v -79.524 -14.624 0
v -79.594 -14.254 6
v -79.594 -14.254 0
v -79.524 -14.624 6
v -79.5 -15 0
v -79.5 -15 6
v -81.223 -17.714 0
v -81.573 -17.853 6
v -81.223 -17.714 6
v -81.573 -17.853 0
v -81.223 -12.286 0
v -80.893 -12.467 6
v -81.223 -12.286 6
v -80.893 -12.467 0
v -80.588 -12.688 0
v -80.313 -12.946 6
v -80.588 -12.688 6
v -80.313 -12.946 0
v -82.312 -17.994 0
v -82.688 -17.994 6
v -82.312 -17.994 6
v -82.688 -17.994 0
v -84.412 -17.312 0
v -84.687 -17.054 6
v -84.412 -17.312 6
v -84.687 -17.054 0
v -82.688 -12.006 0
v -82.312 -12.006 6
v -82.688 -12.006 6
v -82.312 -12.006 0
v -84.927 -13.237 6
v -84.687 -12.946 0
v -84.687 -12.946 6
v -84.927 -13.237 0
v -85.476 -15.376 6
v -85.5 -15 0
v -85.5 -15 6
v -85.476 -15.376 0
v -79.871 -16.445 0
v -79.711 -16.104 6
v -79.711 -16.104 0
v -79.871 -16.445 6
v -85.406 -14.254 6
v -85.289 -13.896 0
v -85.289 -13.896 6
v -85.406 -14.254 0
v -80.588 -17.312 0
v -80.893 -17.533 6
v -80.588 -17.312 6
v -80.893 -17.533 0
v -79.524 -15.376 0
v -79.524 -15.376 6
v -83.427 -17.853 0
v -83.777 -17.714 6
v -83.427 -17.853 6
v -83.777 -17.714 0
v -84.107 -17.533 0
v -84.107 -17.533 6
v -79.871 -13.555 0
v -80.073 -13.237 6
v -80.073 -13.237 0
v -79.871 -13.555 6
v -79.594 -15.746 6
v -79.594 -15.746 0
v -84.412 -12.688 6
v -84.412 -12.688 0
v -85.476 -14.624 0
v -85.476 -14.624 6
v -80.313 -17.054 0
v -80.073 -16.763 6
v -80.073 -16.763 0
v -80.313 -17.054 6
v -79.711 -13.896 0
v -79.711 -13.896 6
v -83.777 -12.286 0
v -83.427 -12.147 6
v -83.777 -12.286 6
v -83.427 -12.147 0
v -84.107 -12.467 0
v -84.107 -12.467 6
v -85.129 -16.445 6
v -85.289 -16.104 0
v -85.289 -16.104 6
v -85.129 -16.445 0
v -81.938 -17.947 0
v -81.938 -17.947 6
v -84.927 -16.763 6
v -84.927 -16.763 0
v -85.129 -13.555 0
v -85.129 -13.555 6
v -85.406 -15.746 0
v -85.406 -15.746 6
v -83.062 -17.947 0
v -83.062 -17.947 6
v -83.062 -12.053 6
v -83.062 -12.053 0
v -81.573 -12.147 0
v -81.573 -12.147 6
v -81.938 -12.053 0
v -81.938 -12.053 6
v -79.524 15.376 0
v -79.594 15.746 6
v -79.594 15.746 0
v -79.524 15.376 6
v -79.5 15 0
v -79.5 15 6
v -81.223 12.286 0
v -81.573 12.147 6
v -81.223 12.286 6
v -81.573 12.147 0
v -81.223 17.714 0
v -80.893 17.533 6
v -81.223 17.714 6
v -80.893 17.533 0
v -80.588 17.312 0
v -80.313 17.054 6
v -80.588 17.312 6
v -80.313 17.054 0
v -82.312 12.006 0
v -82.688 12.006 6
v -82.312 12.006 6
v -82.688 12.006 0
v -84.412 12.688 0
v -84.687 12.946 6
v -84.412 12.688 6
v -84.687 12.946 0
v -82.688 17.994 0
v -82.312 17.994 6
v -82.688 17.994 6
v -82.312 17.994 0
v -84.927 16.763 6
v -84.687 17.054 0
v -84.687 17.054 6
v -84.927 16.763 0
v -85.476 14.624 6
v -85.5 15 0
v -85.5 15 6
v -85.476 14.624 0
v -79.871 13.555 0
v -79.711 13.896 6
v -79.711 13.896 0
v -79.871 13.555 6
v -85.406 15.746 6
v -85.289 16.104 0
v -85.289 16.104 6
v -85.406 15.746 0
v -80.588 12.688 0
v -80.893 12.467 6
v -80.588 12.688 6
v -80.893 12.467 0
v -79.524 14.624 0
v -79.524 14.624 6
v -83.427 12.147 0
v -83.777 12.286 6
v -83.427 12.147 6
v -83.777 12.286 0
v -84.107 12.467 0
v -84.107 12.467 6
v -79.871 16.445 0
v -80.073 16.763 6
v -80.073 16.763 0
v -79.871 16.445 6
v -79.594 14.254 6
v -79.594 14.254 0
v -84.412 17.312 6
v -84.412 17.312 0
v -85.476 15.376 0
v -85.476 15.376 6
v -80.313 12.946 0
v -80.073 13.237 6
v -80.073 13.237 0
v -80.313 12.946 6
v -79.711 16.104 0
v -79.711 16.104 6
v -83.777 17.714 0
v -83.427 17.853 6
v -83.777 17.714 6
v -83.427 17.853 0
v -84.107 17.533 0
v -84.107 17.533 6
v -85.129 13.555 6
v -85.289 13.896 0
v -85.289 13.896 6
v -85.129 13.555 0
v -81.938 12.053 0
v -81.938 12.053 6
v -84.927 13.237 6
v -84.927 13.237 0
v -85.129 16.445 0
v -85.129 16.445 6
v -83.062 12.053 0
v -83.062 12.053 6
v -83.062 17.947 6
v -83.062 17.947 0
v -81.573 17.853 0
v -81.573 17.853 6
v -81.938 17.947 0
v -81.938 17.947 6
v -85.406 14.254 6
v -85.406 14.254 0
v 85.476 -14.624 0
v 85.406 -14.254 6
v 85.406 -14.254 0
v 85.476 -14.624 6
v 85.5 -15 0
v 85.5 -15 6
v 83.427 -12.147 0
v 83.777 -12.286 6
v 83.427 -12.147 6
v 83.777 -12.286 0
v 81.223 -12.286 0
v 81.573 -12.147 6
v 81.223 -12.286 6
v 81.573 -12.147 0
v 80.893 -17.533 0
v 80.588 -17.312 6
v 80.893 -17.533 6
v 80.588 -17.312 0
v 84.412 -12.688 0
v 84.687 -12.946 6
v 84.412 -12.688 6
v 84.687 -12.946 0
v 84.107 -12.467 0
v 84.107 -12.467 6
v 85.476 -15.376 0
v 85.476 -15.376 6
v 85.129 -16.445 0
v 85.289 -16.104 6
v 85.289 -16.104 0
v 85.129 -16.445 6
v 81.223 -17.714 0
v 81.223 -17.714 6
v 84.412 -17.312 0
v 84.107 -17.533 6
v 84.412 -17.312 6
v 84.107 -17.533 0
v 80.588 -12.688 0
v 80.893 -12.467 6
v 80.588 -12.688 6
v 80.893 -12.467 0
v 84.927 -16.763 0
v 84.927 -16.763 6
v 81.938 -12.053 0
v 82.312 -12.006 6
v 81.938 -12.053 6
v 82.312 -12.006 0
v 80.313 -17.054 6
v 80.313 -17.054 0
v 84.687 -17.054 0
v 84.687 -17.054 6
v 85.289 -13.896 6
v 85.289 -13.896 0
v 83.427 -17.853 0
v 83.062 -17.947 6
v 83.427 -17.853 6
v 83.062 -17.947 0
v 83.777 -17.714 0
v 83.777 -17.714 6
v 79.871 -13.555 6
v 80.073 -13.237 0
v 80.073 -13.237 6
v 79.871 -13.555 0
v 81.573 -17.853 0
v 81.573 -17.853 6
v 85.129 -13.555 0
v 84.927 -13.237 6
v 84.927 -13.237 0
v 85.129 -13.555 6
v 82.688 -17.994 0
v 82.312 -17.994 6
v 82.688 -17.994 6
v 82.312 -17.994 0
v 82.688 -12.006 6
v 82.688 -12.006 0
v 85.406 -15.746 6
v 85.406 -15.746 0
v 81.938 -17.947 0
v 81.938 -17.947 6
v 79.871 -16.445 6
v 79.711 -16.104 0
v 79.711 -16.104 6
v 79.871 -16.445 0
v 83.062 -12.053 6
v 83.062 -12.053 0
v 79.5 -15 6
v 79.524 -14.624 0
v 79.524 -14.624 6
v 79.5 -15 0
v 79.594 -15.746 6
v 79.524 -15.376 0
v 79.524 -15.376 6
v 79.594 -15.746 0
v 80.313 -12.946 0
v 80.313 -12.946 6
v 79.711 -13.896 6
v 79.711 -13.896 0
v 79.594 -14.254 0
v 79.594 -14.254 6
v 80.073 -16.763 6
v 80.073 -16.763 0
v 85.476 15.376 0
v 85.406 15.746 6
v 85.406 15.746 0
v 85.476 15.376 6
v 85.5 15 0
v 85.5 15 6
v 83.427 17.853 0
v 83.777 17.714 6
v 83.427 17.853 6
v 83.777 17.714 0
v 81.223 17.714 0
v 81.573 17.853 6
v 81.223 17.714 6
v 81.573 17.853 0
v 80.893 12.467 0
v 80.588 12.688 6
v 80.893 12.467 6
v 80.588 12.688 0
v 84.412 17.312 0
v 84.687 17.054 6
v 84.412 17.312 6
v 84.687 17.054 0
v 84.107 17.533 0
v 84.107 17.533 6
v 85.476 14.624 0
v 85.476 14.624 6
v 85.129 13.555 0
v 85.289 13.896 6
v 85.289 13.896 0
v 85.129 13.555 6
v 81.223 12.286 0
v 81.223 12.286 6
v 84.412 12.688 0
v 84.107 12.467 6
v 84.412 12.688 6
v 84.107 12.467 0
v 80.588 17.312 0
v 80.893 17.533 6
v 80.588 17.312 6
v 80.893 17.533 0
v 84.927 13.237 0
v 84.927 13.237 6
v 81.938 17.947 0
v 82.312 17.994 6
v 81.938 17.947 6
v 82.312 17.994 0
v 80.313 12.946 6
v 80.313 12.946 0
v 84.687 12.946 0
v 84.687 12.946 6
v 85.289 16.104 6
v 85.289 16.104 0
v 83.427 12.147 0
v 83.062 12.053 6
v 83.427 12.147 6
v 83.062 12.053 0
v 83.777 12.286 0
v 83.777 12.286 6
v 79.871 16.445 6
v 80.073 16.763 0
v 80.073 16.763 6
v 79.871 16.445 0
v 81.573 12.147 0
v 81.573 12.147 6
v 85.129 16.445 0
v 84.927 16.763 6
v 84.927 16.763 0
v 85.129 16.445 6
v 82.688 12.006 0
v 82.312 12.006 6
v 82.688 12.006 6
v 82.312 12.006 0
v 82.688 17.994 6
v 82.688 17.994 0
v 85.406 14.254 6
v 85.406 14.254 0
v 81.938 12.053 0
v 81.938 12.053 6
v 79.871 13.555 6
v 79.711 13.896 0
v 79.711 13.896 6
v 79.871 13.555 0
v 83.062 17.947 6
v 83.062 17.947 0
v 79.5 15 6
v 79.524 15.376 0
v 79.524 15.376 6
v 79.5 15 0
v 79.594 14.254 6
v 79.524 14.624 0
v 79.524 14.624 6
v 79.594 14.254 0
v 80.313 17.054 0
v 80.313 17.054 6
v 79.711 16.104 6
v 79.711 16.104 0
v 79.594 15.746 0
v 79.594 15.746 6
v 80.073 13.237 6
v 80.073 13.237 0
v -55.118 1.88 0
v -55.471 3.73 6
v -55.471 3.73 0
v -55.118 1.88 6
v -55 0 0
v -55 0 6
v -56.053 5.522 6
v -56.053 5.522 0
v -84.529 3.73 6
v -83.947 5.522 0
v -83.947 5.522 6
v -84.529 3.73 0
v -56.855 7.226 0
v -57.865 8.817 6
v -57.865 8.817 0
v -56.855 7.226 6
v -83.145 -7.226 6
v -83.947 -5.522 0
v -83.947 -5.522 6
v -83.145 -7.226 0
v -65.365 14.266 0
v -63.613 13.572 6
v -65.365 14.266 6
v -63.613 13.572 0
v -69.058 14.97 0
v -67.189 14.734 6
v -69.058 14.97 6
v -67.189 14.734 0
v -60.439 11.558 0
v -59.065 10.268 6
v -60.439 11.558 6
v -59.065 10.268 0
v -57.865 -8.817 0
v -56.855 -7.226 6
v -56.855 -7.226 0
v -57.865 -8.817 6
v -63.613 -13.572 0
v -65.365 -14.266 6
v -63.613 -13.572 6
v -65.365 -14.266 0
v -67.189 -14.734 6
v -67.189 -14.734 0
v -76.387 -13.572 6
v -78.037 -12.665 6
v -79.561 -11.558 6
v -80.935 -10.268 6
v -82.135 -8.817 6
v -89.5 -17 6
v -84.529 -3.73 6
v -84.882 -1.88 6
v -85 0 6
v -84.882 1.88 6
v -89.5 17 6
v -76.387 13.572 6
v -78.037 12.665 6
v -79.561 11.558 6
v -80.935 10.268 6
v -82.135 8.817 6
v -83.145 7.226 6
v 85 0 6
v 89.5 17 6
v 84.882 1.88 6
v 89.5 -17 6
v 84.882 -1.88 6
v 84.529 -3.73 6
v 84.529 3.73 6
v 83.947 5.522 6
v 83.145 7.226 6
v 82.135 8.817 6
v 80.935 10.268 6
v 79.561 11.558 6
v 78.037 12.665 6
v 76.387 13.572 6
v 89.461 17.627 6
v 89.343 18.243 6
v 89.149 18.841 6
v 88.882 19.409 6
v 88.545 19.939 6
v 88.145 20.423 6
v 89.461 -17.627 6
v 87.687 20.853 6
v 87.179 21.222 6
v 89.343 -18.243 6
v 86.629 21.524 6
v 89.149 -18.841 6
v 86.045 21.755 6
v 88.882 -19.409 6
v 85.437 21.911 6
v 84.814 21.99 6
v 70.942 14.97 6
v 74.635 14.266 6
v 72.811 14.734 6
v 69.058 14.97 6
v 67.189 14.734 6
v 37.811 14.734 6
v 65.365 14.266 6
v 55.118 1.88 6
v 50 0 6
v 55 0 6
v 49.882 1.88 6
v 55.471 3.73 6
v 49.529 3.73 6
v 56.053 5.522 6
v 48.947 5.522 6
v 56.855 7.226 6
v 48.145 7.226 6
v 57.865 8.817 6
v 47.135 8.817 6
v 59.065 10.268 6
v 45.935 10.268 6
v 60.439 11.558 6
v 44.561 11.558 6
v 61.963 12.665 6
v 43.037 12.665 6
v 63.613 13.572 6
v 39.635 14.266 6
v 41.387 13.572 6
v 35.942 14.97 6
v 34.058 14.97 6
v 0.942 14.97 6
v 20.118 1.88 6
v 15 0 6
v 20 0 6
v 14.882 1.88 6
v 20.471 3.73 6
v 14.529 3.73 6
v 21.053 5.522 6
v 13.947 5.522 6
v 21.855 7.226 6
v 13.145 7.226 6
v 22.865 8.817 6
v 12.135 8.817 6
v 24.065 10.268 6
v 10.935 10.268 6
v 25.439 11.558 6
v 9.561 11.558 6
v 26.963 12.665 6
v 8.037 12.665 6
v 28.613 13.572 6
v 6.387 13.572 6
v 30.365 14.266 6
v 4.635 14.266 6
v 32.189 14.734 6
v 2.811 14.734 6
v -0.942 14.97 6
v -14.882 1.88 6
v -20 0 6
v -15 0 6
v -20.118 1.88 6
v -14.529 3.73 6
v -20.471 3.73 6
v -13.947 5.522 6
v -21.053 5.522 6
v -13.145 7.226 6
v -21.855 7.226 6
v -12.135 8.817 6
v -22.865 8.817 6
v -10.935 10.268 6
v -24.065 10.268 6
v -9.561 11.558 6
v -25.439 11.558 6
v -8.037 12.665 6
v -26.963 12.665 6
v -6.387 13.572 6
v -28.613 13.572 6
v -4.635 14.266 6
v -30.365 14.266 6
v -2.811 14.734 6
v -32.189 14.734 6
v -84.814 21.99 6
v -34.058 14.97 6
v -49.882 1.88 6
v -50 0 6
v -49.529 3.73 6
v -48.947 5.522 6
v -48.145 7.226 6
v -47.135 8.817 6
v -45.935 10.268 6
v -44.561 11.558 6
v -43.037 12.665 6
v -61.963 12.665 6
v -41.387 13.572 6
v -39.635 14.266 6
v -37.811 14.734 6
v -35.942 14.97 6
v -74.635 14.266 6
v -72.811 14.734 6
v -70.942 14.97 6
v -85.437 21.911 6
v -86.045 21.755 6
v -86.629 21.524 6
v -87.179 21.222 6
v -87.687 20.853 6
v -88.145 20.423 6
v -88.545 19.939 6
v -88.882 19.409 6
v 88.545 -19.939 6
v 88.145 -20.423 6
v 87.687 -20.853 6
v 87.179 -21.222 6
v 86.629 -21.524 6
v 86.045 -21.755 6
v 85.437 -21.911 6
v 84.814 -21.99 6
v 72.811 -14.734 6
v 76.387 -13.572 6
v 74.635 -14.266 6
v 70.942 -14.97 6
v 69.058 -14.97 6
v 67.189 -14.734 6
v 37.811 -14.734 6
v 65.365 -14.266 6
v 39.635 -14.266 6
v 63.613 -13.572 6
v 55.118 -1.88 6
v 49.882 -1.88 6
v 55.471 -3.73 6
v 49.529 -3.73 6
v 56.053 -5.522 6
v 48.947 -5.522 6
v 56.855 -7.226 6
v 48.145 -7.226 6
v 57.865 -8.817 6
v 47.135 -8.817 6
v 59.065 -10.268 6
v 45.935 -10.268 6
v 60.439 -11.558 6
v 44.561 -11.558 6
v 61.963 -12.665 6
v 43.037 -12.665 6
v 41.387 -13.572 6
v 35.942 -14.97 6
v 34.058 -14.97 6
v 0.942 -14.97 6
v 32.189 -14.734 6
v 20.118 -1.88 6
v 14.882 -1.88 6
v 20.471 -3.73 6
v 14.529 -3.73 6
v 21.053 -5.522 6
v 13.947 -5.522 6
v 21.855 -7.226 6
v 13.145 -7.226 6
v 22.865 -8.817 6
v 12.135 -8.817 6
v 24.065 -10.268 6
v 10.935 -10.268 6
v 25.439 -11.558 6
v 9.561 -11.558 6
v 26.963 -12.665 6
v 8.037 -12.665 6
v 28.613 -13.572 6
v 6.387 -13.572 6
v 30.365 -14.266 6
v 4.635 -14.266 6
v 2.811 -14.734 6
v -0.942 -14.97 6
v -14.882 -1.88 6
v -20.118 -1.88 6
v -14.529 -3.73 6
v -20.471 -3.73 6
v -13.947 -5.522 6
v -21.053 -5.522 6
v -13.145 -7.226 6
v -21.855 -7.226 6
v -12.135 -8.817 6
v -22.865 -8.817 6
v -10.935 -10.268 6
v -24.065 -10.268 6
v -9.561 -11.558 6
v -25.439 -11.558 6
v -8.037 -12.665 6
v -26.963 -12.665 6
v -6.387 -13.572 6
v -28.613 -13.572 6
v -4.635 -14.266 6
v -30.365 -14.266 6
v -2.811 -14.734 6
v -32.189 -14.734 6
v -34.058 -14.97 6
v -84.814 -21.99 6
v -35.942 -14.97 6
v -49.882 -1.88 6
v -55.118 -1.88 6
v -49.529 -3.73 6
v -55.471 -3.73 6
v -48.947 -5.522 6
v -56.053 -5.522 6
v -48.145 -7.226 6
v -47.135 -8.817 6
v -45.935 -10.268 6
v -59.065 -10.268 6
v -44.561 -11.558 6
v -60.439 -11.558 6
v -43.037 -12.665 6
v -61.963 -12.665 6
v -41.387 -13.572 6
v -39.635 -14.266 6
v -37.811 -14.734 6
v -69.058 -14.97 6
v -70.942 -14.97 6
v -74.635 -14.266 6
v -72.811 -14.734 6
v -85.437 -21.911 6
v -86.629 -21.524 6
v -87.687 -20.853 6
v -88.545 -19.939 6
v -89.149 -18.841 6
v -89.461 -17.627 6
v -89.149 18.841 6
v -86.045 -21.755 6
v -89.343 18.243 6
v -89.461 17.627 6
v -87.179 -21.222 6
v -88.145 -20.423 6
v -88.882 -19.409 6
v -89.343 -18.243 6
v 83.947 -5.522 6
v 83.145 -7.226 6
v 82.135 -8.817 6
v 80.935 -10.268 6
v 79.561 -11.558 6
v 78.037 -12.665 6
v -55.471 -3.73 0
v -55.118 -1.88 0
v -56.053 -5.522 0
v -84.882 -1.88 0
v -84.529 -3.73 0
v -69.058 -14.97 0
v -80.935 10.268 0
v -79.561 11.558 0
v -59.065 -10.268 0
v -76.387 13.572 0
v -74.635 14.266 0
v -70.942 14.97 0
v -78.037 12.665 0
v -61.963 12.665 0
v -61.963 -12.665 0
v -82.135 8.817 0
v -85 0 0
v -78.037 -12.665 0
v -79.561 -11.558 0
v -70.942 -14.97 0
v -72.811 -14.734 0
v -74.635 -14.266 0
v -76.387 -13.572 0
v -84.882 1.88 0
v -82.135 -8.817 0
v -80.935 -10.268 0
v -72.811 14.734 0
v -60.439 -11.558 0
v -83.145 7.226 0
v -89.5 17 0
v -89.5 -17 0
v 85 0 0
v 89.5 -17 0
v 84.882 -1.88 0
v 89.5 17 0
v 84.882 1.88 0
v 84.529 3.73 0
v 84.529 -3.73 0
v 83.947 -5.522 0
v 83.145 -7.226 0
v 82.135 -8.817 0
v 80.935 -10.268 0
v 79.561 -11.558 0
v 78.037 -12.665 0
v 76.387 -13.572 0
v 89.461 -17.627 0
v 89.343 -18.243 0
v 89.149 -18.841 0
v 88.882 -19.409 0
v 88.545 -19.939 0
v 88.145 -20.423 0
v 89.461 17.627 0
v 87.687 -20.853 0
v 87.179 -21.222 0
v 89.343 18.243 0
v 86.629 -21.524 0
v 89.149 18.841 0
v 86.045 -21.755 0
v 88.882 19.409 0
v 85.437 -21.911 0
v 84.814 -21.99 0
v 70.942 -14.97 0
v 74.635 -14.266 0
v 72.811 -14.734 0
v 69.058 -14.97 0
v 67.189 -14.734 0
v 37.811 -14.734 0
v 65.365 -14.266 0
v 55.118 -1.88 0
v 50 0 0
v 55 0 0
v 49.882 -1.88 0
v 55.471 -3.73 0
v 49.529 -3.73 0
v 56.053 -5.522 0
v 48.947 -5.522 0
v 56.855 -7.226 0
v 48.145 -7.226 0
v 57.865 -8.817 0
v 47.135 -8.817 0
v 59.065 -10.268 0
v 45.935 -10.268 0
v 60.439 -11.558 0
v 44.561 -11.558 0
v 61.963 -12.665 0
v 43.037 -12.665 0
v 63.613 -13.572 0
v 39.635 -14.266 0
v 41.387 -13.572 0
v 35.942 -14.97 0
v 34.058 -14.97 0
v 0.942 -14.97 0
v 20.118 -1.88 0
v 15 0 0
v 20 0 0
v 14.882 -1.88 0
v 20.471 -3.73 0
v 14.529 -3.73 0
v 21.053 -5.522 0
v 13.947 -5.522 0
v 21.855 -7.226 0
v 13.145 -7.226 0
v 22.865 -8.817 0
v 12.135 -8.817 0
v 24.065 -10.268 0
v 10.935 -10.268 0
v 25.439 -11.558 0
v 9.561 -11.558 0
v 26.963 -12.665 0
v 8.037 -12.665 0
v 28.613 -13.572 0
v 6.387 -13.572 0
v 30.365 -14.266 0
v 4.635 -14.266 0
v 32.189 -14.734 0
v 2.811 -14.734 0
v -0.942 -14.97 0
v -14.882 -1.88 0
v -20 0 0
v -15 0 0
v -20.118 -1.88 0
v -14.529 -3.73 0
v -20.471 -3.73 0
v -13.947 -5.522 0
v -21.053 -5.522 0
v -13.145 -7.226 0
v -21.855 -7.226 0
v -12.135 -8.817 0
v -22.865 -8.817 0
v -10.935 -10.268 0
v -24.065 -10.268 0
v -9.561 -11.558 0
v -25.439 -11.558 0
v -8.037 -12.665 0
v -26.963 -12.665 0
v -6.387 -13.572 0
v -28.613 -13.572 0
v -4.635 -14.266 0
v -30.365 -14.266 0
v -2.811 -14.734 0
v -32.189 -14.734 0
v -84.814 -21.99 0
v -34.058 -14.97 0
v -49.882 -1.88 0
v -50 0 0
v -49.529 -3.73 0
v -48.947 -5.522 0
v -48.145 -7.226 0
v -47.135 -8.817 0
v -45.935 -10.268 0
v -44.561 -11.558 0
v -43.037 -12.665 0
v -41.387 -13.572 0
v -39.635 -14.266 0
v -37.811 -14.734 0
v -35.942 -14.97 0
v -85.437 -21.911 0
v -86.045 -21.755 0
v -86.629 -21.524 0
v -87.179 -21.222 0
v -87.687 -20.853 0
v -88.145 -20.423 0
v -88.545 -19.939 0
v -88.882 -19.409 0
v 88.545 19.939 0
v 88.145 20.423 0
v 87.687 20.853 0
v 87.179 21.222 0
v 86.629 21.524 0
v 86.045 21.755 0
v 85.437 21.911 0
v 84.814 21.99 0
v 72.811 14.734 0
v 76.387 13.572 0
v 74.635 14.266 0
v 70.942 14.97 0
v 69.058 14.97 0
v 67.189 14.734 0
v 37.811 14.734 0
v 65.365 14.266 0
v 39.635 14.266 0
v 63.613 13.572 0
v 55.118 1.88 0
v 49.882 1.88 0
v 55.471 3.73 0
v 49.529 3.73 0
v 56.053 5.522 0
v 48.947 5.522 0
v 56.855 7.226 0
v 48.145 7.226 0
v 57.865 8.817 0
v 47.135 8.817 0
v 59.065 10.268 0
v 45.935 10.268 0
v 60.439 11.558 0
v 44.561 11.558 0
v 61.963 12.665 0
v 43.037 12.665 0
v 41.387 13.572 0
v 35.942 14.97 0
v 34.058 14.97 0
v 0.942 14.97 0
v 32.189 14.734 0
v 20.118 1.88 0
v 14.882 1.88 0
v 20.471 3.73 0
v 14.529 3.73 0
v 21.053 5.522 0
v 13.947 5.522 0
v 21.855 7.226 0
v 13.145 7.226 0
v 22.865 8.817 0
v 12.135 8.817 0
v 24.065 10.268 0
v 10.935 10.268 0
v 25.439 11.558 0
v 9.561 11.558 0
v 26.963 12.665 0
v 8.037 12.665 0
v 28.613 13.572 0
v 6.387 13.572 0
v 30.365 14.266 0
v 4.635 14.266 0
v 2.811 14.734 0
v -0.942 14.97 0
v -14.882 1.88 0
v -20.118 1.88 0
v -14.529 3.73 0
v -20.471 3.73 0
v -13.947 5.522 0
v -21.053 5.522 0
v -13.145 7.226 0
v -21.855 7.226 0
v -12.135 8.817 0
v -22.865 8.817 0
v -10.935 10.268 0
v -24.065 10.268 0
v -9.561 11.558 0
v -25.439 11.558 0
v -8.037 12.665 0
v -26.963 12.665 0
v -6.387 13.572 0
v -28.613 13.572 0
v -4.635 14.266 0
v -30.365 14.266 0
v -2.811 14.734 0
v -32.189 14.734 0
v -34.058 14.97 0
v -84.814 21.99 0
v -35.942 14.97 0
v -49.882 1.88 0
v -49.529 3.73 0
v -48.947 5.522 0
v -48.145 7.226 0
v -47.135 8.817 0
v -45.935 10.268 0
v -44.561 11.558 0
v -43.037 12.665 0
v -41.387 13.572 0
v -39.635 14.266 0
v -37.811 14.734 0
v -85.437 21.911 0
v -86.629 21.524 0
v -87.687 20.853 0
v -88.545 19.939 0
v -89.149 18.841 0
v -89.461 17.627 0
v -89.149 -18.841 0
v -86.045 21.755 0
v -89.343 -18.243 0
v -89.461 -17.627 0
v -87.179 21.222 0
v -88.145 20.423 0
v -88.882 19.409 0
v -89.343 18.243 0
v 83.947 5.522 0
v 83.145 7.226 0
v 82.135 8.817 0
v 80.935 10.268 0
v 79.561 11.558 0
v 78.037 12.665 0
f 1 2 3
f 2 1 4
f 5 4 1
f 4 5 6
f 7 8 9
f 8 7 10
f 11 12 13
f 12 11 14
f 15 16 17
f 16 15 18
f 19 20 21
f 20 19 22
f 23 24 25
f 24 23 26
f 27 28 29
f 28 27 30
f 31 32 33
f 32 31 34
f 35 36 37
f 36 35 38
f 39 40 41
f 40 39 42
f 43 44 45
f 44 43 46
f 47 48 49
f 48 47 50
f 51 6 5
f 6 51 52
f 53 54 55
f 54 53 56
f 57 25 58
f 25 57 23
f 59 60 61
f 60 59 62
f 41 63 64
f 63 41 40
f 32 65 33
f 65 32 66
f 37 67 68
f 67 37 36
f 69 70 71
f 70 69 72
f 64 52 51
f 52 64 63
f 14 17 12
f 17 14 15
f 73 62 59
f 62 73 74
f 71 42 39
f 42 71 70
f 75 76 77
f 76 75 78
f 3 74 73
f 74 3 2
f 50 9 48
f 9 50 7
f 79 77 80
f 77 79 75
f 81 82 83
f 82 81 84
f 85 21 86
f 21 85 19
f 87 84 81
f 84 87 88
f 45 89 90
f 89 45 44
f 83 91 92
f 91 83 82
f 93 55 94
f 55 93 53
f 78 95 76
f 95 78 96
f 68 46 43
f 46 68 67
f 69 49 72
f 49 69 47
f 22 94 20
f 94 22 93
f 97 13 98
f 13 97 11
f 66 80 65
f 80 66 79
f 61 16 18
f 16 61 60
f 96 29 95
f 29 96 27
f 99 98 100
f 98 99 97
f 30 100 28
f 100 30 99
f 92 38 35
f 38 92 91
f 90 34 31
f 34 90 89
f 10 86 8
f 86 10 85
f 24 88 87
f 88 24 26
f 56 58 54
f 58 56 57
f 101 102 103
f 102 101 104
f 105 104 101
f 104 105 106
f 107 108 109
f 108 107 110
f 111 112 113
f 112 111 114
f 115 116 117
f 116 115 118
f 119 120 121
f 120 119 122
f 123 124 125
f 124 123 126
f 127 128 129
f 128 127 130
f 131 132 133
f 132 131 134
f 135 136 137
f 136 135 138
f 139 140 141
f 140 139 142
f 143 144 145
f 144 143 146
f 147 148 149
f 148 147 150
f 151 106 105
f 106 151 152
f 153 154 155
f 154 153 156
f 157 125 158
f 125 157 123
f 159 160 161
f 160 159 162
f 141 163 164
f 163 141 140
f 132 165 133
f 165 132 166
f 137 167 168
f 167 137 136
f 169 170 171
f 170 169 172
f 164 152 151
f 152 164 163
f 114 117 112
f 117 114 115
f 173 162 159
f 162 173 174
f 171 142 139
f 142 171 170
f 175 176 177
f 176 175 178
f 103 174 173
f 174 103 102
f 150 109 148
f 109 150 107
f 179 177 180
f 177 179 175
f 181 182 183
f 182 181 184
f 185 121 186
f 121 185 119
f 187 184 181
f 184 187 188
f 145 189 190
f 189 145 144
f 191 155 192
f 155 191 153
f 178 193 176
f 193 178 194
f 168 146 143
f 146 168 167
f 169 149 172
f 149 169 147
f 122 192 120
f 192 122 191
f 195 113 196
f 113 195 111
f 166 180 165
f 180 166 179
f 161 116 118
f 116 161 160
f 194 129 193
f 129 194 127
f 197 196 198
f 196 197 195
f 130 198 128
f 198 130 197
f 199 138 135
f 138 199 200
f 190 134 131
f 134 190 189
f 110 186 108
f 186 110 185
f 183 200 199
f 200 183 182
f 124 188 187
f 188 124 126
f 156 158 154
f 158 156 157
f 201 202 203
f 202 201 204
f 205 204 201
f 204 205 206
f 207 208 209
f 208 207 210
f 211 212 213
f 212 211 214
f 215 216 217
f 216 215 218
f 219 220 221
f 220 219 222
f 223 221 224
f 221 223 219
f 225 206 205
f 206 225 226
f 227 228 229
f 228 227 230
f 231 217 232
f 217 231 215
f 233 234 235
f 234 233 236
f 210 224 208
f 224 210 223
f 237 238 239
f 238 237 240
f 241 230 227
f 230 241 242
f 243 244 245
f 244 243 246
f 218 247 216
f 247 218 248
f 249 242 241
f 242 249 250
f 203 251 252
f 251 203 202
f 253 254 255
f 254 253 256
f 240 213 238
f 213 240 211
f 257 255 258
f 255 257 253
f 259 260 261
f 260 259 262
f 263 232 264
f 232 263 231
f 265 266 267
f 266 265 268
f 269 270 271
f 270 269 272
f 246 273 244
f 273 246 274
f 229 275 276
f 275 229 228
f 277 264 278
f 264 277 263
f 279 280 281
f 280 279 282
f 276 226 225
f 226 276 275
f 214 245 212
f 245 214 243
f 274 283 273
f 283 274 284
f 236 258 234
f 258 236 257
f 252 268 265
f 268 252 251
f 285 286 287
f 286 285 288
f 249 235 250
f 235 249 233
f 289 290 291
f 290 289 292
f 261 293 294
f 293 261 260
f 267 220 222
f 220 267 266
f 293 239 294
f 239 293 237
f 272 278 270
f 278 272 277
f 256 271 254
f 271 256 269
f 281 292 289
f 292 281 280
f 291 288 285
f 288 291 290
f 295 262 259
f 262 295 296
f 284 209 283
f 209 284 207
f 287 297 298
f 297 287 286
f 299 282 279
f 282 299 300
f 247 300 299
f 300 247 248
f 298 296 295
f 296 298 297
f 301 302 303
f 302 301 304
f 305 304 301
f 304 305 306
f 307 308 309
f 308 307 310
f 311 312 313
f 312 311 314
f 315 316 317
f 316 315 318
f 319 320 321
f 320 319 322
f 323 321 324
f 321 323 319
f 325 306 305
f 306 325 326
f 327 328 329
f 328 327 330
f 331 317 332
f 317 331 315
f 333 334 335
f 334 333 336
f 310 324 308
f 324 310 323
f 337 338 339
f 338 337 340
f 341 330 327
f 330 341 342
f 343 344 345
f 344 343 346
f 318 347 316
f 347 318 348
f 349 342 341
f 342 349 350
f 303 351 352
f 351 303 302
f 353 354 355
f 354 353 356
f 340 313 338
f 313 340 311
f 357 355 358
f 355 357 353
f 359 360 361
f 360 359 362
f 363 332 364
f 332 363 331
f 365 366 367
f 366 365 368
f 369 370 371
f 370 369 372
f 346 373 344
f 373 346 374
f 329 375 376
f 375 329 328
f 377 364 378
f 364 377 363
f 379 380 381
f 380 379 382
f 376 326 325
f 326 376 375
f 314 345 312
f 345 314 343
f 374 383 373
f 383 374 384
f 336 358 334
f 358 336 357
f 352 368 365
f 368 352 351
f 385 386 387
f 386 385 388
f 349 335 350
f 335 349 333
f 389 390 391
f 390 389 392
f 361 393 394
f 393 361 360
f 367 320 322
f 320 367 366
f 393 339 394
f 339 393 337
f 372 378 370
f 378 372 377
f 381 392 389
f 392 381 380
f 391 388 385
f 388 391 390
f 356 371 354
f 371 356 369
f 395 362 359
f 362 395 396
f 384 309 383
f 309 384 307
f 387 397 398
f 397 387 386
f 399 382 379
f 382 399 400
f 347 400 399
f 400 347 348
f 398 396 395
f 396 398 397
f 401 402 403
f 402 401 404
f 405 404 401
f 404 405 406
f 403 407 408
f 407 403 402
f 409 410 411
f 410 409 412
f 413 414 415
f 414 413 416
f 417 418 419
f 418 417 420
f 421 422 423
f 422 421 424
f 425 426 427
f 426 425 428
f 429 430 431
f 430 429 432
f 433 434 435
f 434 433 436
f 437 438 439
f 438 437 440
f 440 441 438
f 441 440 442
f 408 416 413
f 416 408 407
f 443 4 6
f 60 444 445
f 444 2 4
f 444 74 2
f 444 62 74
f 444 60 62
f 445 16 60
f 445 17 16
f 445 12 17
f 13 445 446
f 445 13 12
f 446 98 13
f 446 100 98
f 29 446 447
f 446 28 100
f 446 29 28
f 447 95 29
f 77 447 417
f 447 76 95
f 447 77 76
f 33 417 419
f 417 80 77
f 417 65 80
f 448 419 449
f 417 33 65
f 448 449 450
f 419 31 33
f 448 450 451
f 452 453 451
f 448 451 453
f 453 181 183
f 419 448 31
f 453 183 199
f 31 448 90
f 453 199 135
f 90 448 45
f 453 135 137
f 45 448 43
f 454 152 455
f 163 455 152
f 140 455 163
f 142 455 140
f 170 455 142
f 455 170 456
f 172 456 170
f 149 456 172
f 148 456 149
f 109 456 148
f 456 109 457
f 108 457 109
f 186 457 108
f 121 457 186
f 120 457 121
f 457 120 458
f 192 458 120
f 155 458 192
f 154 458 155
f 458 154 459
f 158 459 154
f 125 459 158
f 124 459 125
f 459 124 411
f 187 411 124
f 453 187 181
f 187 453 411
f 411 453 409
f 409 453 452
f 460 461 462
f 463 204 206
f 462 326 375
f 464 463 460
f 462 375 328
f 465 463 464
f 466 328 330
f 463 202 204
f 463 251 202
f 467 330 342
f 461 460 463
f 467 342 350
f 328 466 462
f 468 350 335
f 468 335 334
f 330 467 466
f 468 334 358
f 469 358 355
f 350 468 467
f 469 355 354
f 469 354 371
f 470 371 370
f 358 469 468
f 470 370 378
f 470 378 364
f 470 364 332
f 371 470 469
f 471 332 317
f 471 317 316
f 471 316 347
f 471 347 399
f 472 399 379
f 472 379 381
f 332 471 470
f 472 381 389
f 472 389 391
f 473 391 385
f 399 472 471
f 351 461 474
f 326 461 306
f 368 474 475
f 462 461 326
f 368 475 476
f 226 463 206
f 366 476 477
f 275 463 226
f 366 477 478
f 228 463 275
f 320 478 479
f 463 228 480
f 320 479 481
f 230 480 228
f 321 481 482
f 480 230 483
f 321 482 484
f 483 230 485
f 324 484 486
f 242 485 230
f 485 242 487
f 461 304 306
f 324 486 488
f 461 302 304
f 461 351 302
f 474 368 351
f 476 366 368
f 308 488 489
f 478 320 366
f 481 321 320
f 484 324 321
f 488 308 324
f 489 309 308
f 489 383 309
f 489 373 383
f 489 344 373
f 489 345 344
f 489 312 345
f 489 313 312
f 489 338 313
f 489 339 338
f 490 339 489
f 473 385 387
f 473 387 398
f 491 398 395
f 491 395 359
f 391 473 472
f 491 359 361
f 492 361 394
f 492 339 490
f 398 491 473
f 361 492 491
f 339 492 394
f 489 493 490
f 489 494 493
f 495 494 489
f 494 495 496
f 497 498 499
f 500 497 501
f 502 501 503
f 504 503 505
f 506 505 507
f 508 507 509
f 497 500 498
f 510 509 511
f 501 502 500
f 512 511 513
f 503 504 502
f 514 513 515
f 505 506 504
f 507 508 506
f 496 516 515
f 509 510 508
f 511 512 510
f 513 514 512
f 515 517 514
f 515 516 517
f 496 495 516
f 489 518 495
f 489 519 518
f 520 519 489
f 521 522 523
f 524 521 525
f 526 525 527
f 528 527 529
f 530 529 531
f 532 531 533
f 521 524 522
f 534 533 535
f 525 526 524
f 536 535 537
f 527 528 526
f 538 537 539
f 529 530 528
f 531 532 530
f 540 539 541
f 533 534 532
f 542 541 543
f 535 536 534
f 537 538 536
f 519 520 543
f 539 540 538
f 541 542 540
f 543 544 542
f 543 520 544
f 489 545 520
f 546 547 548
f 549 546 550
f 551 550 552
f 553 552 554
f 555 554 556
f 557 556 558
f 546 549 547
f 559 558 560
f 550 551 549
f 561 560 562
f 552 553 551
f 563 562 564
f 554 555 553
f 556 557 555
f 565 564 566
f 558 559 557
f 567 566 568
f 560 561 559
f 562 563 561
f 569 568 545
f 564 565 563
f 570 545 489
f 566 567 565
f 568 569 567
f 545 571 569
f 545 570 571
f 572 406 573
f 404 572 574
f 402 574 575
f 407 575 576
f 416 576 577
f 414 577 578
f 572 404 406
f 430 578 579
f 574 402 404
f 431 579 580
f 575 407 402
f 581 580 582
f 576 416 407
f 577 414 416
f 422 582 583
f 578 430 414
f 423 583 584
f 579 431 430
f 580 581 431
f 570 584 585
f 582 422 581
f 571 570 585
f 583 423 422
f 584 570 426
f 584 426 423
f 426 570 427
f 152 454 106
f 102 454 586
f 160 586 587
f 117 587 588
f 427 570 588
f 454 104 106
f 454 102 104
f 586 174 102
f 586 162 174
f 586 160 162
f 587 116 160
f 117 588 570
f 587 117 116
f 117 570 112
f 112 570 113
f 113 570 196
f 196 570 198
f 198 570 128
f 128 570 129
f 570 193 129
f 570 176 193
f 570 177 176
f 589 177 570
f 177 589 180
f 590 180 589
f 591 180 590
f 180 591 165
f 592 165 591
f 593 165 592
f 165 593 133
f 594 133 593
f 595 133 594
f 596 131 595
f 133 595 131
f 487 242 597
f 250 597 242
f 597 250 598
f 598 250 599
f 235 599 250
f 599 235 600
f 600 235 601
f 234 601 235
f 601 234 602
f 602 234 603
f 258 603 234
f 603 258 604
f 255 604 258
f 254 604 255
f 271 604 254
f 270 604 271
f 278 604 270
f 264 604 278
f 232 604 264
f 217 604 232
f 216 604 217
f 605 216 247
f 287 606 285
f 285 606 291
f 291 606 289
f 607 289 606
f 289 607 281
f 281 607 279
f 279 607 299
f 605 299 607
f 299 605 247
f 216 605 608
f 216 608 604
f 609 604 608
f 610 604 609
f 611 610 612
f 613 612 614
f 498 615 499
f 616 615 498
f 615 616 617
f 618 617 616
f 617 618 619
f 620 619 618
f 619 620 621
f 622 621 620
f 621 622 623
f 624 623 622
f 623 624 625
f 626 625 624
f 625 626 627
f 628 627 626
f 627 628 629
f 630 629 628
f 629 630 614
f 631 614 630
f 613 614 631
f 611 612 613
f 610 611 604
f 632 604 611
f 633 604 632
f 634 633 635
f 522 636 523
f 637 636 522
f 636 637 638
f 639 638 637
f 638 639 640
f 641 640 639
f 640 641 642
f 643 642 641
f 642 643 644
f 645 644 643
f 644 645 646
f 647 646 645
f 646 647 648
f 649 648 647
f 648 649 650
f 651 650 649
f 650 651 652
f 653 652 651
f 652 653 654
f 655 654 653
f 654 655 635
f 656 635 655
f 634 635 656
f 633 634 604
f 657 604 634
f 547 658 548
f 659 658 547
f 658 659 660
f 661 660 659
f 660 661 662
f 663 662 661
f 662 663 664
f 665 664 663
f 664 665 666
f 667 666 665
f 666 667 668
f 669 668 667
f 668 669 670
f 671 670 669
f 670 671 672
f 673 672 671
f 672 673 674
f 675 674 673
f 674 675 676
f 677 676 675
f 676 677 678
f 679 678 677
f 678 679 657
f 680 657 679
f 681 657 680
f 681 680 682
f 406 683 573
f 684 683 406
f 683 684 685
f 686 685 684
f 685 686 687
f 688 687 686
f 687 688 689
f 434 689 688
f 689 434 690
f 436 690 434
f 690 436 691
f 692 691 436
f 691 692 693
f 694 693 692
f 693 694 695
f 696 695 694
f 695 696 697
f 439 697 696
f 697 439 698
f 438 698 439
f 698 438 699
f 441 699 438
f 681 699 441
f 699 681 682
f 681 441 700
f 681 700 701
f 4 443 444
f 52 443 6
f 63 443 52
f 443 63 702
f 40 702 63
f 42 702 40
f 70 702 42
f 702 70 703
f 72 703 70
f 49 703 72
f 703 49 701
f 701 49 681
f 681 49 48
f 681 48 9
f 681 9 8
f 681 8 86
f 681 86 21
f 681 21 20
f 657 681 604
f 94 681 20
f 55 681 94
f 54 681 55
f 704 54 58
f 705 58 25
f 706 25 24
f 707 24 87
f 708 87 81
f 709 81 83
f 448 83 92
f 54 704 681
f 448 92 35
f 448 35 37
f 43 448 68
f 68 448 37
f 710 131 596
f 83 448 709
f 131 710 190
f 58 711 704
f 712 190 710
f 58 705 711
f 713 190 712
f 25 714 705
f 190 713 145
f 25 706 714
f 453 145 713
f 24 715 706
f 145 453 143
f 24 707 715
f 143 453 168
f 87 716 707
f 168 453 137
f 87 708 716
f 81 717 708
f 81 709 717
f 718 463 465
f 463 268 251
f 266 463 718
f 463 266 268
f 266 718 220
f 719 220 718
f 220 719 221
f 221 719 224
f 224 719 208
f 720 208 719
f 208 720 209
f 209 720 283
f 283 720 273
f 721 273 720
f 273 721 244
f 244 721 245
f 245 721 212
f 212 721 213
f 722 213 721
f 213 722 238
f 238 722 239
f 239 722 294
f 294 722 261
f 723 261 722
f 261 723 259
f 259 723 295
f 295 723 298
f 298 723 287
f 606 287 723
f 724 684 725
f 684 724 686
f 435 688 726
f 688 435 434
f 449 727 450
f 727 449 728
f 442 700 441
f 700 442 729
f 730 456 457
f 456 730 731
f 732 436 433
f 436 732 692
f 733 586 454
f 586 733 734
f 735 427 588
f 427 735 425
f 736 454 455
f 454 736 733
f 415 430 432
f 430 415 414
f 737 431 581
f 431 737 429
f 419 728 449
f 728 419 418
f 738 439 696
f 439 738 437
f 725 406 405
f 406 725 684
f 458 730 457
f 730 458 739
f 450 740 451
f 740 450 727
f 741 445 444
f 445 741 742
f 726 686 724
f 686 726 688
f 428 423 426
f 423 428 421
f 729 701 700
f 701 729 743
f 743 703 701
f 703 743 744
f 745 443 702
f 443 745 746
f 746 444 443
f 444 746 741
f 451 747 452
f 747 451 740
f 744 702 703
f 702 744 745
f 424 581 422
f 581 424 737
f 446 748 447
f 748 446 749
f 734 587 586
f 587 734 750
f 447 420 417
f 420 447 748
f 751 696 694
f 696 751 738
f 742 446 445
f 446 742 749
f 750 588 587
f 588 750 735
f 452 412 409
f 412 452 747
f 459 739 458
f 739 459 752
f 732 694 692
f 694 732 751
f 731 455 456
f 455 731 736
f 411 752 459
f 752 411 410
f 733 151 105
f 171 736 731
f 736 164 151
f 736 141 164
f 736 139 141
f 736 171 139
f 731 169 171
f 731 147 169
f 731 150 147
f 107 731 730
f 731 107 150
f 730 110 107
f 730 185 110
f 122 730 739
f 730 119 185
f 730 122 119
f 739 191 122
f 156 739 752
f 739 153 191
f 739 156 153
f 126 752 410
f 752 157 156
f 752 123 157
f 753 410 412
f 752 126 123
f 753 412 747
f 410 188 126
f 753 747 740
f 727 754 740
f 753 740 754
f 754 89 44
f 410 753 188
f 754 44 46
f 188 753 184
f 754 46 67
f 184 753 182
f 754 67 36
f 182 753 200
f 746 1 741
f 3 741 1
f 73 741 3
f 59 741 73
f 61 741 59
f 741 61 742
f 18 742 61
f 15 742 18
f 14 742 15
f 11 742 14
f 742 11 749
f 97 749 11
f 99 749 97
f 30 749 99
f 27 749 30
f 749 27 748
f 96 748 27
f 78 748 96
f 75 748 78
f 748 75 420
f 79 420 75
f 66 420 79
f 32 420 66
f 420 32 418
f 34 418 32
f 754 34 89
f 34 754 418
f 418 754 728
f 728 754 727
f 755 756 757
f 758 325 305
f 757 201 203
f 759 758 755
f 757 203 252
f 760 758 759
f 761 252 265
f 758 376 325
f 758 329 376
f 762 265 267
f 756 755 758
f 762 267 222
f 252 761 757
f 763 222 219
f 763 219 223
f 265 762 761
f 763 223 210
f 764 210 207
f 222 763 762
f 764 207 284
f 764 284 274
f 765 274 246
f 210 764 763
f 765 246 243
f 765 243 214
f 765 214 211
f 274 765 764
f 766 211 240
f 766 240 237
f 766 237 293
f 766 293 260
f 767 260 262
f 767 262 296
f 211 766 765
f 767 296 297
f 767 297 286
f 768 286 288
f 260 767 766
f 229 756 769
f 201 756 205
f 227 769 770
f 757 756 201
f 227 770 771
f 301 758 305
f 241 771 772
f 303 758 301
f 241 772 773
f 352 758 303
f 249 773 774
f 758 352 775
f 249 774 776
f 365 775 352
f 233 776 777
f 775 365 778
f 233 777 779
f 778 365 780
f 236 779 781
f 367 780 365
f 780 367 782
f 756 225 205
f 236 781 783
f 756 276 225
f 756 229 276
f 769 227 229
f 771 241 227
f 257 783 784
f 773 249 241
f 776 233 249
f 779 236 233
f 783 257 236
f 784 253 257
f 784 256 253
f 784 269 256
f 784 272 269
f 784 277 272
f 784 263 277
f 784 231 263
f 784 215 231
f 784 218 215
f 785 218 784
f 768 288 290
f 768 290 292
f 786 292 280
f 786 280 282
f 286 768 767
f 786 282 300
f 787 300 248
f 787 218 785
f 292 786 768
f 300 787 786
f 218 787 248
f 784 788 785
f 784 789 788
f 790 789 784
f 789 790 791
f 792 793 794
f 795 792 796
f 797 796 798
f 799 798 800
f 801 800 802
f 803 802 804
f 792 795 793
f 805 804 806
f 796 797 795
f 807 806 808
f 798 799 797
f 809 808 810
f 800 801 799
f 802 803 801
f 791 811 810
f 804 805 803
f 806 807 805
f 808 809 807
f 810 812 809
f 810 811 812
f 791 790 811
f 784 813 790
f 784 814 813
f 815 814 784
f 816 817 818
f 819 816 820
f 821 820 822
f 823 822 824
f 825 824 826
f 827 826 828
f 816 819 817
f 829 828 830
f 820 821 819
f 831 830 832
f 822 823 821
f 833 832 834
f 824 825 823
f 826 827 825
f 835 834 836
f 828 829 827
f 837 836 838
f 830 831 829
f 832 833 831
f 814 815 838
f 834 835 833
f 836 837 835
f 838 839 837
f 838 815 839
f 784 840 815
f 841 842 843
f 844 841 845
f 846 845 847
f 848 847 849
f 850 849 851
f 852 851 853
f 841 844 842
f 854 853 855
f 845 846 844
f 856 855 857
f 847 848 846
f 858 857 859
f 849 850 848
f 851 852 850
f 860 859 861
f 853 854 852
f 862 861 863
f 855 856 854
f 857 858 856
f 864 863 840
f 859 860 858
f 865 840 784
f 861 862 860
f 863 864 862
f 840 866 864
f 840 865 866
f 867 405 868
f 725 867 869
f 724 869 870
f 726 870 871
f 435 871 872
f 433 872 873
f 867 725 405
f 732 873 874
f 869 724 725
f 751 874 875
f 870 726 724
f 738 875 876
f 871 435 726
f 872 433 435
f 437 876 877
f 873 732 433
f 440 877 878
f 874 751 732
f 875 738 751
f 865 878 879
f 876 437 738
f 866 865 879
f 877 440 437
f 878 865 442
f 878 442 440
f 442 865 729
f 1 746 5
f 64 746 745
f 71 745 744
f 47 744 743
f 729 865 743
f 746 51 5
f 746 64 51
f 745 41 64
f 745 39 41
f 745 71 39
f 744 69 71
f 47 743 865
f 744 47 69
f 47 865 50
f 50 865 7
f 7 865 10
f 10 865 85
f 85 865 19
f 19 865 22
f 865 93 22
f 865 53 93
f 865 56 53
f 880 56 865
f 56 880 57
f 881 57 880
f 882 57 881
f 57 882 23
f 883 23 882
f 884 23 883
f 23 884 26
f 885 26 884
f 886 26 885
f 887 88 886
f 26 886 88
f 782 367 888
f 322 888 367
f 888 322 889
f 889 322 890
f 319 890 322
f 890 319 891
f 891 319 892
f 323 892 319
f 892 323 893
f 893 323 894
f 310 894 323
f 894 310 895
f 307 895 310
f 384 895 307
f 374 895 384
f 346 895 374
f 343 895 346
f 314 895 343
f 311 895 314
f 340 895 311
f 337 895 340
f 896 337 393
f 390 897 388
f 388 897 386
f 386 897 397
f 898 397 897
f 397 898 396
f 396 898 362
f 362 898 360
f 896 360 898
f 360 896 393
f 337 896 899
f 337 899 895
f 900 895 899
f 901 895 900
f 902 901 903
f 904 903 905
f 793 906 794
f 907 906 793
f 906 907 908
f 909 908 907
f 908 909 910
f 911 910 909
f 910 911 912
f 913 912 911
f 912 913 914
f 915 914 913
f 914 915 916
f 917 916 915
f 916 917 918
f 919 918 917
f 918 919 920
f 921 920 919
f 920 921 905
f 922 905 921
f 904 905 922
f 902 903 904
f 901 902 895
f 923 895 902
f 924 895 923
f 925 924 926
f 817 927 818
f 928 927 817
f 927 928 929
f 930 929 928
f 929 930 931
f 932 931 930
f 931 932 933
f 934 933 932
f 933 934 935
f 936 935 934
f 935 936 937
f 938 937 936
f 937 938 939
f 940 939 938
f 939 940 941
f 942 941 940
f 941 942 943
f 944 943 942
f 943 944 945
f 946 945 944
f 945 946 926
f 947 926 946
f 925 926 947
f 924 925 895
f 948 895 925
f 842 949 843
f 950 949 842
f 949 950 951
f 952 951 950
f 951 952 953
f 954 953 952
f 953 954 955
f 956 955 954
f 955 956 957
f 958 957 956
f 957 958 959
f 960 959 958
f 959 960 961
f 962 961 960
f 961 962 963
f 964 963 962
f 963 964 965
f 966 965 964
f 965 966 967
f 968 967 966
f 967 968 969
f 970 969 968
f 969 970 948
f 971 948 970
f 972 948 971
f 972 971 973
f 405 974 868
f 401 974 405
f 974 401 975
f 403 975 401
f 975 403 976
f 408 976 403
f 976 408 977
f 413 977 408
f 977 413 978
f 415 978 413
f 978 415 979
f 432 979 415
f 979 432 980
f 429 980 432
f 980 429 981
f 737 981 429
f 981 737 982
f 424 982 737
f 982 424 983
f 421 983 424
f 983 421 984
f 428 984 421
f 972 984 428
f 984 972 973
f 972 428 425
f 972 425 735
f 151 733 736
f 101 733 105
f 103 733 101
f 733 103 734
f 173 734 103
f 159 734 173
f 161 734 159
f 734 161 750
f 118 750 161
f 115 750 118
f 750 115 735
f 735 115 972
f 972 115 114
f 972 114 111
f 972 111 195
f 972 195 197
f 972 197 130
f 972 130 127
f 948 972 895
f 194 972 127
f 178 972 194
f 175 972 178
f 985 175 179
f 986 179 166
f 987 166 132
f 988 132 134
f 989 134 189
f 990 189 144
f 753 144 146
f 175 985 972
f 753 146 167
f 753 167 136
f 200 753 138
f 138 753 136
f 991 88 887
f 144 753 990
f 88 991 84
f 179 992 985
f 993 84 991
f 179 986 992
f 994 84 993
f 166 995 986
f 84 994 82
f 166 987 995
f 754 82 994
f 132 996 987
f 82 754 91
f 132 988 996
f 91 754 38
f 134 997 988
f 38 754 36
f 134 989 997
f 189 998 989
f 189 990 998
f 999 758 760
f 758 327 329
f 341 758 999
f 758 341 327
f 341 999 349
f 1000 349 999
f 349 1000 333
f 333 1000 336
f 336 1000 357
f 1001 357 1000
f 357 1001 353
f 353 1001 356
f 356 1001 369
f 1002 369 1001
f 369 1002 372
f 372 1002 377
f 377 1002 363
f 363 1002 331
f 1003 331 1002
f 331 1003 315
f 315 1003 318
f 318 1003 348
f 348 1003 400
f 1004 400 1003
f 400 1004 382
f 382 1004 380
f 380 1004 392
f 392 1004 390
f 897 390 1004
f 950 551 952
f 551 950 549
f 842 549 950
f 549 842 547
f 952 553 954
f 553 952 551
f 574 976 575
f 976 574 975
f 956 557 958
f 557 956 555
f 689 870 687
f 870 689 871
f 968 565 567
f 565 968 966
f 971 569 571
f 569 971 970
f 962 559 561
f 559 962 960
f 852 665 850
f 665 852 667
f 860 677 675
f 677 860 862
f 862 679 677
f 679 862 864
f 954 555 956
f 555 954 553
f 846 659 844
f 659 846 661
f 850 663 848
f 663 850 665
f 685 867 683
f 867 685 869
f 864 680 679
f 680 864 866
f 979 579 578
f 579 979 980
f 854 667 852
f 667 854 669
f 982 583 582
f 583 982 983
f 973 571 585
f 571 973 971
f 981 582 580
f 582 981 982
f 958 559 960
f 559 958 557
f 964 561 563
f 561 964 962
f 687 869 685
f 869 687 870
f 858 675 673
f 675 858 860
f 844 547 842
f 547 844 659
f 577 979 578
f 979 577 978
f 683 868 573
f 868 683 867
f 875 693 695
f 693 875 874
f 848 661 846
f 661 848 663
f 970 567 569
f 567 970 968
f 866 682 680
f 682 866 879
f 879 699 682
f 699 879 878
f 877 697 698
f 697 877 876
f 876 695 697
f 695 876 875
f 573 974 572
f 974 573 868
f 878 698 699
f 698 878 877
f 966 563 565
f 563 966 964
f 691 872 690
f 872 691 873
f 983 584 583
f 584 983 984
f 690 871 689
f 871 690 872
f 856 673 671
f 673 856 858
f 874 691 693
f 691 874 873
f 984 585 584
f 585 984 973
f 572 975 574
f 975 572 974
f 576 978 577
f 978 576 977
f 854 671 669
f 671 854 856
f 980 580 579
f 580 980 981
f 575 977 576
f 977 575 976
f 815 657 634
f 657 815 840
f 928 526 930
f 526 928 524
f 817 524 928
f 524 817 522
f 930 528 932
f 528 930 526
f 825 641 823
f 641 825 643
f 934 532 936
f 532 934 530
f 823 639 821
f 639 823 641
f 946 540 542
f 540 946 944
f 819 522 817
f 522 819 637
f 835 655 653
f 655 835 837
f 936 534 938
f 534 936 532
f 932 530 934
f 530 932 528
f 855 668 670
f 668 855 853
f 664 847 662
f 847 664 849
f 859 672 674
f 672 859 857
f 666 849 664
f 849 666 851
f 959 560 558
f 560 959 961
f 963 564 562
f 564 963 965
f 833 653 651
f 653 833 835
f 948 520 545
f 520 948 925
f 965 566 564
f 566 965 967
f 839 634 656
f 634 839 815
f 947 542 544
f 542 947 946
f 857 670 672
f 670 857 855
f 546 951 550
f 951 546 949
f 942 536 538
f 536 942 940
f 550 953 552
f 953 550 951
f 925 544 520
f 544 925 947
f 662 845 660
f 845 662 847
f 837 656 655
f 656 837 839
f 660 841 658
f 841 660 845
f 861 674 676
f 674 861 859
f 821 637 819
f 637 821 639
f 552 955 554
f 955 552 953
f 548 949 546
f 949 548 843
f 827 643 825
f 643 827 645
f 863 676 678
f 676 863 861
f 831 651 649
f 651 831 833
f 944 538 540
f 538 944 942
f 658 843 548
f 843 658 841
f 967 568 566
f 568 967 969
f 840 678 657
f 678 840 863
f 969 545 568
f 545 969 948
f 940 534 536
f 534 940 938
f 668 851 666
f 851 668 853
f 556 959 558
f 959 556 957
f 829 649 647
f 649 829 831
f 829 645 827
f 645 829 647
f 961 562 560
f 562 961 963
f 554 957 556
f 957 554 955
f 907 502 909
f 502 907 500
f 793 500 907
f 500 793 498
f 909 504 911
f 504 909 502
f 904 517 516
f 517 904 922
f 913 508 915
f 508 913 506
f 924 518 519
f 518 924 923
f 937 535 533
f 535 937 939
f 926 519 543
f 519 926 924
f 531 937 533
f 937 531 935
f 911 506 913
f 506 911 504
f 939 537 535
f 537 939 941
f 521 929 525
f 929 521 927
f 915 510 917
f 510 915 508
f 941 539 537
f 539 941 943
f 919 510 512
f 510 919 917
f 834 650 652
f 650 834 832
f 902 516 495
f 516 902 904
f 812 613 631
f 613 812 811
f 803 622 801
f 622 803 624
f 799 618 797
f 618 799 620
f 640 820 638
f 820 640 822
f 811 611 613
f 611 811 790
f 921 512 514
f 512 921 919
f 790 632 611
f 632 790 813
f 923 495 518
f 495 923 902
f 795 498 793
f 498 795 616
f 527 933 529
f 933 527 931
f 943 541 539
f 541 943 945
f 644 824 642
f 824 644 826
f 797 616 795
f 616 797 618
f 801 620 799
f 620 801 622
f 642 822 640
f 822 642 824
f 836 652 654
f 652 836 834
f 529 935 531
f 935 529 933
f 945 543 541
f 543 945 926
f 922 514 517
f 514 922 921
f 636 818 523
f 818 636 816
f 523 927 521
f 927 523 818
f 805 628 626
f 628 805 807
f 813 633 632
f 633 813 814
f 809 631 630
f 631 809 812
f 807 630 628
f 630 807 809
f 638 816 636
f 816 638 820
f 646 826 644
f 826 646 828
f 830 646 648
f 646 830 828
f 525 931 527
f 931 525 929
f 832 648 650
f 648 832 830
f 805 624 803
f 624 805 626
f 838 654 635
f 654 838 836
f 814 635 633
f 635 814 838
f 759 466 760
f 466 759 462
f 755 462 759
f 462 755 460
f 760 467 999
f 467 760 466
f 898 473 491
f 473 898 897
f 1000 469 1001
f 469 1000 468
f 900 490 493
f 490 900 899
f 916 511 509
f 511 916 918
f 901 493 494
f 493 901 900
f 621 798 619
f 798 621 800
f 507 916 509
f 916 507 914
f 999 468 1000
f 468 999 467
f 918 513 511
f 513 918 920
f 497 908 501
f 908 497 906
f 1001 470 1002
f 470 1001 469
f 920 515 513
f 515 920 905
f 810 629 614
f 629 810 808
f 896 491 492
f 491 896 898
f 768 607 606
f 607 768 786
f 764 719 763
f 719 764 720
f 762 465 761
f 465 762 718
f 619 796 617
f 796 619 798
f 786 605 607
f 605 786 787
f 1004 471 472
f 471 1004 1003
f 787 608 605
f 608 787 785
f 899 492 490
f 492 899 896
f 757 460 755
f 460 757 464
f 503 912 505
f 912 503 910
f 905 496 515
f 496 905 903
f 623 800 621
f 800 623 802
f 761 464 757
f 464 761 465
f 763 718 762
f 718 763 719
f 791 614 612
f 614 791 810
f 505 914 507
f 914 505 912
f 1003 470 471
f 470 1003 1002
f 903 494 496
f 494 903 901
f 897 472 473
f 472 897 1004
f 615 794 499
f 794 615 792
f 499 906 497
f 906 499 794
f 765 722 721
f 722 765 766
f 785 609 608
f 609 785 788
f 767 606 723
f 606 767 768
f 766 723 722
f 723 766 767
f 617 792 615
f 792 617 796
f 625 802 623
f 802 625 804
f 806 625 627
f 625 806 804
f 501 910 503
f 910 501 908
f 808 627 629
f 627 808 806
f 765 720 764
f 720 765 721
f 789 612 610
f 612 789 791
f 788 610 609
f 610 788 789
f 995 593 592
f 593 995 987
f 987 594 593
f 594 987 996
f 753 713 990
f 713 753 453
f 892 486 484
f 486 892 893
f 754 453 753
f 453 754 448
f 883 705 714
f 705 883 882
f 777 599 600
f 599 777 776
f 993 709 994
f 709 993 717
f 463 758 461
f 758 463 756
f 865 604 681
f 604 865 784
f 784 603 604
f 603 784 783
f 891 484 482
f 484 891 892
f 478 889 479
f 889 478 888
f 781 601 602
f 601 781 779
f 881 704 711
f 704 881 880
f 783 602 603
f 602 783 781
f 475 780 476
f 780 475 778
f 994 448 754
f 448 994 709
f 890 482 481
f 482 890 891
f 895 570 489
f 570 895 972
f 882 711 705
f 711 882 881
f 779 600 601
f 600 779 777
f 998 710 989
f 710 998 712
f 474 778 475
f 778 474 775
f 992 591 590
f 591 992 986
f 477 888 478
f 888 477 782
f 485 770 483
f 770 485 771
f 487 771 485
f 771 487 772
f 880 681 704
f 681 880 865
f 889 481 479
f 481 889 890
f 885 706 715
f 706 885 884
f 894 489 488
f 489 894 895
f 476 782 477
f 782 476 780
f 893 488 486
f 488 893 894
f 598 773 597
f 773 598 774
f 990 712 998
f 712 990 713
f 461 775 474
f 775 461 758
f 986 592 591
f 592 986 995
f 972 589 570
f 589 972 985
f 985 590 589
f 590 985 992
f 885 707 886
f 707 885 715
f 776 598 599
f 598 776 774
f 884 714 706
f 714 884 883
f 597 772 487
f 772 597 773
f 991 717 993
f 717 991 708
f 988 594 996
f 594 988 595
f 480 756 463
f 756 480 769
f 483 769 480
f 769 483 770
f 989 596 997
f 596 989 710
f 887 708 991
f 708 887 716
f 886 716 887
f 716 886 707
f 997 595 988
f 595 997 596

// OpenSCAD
$fn = 50;


difference() {
	union() {
		hull() {
			translate(v = [-84.5000000000, 17.0000000000, 0]) {
				cylinder(h = 6, r = 5);
			}
			translate(v = [84.5000000000, 17.0000000000, 0]) {
				cylinder(h = 6, r = 5);
			}
			translate(v = [-84.5000000000, -17.0000000000, 0]) {
				cylinder(h = 6, r = 5);
			}
			translate(v = [84.5000000000, -17.0000000000, 0]) {
				cylinder(h = 6, r = 5);
			}
		}
	}
	union() {
		#translate(v = [-82.5000000000, -15.0000000000, -100.0000000000]) {
			cylinder(h = 200, r = 3.0000000000);
		}
		#translate(v = [-82.5000000000, 15.0000000000, -100.0000000000]) {
			cylinder(h = 200, r = 3.0000000000);
		}
		#translate(v = [82.5000000000, -15.0000000000, -100.0000000000]) {
			cylinder(h = 200, r = 3.0000000000);
		}
		#translate(v = [82.5000000000, 15.0000000000, -100.0000000000]) {
			cylinder(h = 200, r = 3.0000000000);
		}
		#translate(v = [-70.0000000000, 0, 0]) {
			cylinder(h = 6, r = 15.0000000000);
		}
		#translate(v = [-35.0000000000, 0, 0]) {
			cylinder(h = 6, r = 15.0000000000);
		}
		#cylinder(h = 6, r = 15.0000000000);
		#translate(v = [35.0000000000, 0, 0]) {
			cylinder(h = 6, r = 15.0000000000);
		}
		#translate(v = [70.0000000000, 0, 0]) {
			cylinder(h = 6, r = 15.0000000000);
		}
	}
}
